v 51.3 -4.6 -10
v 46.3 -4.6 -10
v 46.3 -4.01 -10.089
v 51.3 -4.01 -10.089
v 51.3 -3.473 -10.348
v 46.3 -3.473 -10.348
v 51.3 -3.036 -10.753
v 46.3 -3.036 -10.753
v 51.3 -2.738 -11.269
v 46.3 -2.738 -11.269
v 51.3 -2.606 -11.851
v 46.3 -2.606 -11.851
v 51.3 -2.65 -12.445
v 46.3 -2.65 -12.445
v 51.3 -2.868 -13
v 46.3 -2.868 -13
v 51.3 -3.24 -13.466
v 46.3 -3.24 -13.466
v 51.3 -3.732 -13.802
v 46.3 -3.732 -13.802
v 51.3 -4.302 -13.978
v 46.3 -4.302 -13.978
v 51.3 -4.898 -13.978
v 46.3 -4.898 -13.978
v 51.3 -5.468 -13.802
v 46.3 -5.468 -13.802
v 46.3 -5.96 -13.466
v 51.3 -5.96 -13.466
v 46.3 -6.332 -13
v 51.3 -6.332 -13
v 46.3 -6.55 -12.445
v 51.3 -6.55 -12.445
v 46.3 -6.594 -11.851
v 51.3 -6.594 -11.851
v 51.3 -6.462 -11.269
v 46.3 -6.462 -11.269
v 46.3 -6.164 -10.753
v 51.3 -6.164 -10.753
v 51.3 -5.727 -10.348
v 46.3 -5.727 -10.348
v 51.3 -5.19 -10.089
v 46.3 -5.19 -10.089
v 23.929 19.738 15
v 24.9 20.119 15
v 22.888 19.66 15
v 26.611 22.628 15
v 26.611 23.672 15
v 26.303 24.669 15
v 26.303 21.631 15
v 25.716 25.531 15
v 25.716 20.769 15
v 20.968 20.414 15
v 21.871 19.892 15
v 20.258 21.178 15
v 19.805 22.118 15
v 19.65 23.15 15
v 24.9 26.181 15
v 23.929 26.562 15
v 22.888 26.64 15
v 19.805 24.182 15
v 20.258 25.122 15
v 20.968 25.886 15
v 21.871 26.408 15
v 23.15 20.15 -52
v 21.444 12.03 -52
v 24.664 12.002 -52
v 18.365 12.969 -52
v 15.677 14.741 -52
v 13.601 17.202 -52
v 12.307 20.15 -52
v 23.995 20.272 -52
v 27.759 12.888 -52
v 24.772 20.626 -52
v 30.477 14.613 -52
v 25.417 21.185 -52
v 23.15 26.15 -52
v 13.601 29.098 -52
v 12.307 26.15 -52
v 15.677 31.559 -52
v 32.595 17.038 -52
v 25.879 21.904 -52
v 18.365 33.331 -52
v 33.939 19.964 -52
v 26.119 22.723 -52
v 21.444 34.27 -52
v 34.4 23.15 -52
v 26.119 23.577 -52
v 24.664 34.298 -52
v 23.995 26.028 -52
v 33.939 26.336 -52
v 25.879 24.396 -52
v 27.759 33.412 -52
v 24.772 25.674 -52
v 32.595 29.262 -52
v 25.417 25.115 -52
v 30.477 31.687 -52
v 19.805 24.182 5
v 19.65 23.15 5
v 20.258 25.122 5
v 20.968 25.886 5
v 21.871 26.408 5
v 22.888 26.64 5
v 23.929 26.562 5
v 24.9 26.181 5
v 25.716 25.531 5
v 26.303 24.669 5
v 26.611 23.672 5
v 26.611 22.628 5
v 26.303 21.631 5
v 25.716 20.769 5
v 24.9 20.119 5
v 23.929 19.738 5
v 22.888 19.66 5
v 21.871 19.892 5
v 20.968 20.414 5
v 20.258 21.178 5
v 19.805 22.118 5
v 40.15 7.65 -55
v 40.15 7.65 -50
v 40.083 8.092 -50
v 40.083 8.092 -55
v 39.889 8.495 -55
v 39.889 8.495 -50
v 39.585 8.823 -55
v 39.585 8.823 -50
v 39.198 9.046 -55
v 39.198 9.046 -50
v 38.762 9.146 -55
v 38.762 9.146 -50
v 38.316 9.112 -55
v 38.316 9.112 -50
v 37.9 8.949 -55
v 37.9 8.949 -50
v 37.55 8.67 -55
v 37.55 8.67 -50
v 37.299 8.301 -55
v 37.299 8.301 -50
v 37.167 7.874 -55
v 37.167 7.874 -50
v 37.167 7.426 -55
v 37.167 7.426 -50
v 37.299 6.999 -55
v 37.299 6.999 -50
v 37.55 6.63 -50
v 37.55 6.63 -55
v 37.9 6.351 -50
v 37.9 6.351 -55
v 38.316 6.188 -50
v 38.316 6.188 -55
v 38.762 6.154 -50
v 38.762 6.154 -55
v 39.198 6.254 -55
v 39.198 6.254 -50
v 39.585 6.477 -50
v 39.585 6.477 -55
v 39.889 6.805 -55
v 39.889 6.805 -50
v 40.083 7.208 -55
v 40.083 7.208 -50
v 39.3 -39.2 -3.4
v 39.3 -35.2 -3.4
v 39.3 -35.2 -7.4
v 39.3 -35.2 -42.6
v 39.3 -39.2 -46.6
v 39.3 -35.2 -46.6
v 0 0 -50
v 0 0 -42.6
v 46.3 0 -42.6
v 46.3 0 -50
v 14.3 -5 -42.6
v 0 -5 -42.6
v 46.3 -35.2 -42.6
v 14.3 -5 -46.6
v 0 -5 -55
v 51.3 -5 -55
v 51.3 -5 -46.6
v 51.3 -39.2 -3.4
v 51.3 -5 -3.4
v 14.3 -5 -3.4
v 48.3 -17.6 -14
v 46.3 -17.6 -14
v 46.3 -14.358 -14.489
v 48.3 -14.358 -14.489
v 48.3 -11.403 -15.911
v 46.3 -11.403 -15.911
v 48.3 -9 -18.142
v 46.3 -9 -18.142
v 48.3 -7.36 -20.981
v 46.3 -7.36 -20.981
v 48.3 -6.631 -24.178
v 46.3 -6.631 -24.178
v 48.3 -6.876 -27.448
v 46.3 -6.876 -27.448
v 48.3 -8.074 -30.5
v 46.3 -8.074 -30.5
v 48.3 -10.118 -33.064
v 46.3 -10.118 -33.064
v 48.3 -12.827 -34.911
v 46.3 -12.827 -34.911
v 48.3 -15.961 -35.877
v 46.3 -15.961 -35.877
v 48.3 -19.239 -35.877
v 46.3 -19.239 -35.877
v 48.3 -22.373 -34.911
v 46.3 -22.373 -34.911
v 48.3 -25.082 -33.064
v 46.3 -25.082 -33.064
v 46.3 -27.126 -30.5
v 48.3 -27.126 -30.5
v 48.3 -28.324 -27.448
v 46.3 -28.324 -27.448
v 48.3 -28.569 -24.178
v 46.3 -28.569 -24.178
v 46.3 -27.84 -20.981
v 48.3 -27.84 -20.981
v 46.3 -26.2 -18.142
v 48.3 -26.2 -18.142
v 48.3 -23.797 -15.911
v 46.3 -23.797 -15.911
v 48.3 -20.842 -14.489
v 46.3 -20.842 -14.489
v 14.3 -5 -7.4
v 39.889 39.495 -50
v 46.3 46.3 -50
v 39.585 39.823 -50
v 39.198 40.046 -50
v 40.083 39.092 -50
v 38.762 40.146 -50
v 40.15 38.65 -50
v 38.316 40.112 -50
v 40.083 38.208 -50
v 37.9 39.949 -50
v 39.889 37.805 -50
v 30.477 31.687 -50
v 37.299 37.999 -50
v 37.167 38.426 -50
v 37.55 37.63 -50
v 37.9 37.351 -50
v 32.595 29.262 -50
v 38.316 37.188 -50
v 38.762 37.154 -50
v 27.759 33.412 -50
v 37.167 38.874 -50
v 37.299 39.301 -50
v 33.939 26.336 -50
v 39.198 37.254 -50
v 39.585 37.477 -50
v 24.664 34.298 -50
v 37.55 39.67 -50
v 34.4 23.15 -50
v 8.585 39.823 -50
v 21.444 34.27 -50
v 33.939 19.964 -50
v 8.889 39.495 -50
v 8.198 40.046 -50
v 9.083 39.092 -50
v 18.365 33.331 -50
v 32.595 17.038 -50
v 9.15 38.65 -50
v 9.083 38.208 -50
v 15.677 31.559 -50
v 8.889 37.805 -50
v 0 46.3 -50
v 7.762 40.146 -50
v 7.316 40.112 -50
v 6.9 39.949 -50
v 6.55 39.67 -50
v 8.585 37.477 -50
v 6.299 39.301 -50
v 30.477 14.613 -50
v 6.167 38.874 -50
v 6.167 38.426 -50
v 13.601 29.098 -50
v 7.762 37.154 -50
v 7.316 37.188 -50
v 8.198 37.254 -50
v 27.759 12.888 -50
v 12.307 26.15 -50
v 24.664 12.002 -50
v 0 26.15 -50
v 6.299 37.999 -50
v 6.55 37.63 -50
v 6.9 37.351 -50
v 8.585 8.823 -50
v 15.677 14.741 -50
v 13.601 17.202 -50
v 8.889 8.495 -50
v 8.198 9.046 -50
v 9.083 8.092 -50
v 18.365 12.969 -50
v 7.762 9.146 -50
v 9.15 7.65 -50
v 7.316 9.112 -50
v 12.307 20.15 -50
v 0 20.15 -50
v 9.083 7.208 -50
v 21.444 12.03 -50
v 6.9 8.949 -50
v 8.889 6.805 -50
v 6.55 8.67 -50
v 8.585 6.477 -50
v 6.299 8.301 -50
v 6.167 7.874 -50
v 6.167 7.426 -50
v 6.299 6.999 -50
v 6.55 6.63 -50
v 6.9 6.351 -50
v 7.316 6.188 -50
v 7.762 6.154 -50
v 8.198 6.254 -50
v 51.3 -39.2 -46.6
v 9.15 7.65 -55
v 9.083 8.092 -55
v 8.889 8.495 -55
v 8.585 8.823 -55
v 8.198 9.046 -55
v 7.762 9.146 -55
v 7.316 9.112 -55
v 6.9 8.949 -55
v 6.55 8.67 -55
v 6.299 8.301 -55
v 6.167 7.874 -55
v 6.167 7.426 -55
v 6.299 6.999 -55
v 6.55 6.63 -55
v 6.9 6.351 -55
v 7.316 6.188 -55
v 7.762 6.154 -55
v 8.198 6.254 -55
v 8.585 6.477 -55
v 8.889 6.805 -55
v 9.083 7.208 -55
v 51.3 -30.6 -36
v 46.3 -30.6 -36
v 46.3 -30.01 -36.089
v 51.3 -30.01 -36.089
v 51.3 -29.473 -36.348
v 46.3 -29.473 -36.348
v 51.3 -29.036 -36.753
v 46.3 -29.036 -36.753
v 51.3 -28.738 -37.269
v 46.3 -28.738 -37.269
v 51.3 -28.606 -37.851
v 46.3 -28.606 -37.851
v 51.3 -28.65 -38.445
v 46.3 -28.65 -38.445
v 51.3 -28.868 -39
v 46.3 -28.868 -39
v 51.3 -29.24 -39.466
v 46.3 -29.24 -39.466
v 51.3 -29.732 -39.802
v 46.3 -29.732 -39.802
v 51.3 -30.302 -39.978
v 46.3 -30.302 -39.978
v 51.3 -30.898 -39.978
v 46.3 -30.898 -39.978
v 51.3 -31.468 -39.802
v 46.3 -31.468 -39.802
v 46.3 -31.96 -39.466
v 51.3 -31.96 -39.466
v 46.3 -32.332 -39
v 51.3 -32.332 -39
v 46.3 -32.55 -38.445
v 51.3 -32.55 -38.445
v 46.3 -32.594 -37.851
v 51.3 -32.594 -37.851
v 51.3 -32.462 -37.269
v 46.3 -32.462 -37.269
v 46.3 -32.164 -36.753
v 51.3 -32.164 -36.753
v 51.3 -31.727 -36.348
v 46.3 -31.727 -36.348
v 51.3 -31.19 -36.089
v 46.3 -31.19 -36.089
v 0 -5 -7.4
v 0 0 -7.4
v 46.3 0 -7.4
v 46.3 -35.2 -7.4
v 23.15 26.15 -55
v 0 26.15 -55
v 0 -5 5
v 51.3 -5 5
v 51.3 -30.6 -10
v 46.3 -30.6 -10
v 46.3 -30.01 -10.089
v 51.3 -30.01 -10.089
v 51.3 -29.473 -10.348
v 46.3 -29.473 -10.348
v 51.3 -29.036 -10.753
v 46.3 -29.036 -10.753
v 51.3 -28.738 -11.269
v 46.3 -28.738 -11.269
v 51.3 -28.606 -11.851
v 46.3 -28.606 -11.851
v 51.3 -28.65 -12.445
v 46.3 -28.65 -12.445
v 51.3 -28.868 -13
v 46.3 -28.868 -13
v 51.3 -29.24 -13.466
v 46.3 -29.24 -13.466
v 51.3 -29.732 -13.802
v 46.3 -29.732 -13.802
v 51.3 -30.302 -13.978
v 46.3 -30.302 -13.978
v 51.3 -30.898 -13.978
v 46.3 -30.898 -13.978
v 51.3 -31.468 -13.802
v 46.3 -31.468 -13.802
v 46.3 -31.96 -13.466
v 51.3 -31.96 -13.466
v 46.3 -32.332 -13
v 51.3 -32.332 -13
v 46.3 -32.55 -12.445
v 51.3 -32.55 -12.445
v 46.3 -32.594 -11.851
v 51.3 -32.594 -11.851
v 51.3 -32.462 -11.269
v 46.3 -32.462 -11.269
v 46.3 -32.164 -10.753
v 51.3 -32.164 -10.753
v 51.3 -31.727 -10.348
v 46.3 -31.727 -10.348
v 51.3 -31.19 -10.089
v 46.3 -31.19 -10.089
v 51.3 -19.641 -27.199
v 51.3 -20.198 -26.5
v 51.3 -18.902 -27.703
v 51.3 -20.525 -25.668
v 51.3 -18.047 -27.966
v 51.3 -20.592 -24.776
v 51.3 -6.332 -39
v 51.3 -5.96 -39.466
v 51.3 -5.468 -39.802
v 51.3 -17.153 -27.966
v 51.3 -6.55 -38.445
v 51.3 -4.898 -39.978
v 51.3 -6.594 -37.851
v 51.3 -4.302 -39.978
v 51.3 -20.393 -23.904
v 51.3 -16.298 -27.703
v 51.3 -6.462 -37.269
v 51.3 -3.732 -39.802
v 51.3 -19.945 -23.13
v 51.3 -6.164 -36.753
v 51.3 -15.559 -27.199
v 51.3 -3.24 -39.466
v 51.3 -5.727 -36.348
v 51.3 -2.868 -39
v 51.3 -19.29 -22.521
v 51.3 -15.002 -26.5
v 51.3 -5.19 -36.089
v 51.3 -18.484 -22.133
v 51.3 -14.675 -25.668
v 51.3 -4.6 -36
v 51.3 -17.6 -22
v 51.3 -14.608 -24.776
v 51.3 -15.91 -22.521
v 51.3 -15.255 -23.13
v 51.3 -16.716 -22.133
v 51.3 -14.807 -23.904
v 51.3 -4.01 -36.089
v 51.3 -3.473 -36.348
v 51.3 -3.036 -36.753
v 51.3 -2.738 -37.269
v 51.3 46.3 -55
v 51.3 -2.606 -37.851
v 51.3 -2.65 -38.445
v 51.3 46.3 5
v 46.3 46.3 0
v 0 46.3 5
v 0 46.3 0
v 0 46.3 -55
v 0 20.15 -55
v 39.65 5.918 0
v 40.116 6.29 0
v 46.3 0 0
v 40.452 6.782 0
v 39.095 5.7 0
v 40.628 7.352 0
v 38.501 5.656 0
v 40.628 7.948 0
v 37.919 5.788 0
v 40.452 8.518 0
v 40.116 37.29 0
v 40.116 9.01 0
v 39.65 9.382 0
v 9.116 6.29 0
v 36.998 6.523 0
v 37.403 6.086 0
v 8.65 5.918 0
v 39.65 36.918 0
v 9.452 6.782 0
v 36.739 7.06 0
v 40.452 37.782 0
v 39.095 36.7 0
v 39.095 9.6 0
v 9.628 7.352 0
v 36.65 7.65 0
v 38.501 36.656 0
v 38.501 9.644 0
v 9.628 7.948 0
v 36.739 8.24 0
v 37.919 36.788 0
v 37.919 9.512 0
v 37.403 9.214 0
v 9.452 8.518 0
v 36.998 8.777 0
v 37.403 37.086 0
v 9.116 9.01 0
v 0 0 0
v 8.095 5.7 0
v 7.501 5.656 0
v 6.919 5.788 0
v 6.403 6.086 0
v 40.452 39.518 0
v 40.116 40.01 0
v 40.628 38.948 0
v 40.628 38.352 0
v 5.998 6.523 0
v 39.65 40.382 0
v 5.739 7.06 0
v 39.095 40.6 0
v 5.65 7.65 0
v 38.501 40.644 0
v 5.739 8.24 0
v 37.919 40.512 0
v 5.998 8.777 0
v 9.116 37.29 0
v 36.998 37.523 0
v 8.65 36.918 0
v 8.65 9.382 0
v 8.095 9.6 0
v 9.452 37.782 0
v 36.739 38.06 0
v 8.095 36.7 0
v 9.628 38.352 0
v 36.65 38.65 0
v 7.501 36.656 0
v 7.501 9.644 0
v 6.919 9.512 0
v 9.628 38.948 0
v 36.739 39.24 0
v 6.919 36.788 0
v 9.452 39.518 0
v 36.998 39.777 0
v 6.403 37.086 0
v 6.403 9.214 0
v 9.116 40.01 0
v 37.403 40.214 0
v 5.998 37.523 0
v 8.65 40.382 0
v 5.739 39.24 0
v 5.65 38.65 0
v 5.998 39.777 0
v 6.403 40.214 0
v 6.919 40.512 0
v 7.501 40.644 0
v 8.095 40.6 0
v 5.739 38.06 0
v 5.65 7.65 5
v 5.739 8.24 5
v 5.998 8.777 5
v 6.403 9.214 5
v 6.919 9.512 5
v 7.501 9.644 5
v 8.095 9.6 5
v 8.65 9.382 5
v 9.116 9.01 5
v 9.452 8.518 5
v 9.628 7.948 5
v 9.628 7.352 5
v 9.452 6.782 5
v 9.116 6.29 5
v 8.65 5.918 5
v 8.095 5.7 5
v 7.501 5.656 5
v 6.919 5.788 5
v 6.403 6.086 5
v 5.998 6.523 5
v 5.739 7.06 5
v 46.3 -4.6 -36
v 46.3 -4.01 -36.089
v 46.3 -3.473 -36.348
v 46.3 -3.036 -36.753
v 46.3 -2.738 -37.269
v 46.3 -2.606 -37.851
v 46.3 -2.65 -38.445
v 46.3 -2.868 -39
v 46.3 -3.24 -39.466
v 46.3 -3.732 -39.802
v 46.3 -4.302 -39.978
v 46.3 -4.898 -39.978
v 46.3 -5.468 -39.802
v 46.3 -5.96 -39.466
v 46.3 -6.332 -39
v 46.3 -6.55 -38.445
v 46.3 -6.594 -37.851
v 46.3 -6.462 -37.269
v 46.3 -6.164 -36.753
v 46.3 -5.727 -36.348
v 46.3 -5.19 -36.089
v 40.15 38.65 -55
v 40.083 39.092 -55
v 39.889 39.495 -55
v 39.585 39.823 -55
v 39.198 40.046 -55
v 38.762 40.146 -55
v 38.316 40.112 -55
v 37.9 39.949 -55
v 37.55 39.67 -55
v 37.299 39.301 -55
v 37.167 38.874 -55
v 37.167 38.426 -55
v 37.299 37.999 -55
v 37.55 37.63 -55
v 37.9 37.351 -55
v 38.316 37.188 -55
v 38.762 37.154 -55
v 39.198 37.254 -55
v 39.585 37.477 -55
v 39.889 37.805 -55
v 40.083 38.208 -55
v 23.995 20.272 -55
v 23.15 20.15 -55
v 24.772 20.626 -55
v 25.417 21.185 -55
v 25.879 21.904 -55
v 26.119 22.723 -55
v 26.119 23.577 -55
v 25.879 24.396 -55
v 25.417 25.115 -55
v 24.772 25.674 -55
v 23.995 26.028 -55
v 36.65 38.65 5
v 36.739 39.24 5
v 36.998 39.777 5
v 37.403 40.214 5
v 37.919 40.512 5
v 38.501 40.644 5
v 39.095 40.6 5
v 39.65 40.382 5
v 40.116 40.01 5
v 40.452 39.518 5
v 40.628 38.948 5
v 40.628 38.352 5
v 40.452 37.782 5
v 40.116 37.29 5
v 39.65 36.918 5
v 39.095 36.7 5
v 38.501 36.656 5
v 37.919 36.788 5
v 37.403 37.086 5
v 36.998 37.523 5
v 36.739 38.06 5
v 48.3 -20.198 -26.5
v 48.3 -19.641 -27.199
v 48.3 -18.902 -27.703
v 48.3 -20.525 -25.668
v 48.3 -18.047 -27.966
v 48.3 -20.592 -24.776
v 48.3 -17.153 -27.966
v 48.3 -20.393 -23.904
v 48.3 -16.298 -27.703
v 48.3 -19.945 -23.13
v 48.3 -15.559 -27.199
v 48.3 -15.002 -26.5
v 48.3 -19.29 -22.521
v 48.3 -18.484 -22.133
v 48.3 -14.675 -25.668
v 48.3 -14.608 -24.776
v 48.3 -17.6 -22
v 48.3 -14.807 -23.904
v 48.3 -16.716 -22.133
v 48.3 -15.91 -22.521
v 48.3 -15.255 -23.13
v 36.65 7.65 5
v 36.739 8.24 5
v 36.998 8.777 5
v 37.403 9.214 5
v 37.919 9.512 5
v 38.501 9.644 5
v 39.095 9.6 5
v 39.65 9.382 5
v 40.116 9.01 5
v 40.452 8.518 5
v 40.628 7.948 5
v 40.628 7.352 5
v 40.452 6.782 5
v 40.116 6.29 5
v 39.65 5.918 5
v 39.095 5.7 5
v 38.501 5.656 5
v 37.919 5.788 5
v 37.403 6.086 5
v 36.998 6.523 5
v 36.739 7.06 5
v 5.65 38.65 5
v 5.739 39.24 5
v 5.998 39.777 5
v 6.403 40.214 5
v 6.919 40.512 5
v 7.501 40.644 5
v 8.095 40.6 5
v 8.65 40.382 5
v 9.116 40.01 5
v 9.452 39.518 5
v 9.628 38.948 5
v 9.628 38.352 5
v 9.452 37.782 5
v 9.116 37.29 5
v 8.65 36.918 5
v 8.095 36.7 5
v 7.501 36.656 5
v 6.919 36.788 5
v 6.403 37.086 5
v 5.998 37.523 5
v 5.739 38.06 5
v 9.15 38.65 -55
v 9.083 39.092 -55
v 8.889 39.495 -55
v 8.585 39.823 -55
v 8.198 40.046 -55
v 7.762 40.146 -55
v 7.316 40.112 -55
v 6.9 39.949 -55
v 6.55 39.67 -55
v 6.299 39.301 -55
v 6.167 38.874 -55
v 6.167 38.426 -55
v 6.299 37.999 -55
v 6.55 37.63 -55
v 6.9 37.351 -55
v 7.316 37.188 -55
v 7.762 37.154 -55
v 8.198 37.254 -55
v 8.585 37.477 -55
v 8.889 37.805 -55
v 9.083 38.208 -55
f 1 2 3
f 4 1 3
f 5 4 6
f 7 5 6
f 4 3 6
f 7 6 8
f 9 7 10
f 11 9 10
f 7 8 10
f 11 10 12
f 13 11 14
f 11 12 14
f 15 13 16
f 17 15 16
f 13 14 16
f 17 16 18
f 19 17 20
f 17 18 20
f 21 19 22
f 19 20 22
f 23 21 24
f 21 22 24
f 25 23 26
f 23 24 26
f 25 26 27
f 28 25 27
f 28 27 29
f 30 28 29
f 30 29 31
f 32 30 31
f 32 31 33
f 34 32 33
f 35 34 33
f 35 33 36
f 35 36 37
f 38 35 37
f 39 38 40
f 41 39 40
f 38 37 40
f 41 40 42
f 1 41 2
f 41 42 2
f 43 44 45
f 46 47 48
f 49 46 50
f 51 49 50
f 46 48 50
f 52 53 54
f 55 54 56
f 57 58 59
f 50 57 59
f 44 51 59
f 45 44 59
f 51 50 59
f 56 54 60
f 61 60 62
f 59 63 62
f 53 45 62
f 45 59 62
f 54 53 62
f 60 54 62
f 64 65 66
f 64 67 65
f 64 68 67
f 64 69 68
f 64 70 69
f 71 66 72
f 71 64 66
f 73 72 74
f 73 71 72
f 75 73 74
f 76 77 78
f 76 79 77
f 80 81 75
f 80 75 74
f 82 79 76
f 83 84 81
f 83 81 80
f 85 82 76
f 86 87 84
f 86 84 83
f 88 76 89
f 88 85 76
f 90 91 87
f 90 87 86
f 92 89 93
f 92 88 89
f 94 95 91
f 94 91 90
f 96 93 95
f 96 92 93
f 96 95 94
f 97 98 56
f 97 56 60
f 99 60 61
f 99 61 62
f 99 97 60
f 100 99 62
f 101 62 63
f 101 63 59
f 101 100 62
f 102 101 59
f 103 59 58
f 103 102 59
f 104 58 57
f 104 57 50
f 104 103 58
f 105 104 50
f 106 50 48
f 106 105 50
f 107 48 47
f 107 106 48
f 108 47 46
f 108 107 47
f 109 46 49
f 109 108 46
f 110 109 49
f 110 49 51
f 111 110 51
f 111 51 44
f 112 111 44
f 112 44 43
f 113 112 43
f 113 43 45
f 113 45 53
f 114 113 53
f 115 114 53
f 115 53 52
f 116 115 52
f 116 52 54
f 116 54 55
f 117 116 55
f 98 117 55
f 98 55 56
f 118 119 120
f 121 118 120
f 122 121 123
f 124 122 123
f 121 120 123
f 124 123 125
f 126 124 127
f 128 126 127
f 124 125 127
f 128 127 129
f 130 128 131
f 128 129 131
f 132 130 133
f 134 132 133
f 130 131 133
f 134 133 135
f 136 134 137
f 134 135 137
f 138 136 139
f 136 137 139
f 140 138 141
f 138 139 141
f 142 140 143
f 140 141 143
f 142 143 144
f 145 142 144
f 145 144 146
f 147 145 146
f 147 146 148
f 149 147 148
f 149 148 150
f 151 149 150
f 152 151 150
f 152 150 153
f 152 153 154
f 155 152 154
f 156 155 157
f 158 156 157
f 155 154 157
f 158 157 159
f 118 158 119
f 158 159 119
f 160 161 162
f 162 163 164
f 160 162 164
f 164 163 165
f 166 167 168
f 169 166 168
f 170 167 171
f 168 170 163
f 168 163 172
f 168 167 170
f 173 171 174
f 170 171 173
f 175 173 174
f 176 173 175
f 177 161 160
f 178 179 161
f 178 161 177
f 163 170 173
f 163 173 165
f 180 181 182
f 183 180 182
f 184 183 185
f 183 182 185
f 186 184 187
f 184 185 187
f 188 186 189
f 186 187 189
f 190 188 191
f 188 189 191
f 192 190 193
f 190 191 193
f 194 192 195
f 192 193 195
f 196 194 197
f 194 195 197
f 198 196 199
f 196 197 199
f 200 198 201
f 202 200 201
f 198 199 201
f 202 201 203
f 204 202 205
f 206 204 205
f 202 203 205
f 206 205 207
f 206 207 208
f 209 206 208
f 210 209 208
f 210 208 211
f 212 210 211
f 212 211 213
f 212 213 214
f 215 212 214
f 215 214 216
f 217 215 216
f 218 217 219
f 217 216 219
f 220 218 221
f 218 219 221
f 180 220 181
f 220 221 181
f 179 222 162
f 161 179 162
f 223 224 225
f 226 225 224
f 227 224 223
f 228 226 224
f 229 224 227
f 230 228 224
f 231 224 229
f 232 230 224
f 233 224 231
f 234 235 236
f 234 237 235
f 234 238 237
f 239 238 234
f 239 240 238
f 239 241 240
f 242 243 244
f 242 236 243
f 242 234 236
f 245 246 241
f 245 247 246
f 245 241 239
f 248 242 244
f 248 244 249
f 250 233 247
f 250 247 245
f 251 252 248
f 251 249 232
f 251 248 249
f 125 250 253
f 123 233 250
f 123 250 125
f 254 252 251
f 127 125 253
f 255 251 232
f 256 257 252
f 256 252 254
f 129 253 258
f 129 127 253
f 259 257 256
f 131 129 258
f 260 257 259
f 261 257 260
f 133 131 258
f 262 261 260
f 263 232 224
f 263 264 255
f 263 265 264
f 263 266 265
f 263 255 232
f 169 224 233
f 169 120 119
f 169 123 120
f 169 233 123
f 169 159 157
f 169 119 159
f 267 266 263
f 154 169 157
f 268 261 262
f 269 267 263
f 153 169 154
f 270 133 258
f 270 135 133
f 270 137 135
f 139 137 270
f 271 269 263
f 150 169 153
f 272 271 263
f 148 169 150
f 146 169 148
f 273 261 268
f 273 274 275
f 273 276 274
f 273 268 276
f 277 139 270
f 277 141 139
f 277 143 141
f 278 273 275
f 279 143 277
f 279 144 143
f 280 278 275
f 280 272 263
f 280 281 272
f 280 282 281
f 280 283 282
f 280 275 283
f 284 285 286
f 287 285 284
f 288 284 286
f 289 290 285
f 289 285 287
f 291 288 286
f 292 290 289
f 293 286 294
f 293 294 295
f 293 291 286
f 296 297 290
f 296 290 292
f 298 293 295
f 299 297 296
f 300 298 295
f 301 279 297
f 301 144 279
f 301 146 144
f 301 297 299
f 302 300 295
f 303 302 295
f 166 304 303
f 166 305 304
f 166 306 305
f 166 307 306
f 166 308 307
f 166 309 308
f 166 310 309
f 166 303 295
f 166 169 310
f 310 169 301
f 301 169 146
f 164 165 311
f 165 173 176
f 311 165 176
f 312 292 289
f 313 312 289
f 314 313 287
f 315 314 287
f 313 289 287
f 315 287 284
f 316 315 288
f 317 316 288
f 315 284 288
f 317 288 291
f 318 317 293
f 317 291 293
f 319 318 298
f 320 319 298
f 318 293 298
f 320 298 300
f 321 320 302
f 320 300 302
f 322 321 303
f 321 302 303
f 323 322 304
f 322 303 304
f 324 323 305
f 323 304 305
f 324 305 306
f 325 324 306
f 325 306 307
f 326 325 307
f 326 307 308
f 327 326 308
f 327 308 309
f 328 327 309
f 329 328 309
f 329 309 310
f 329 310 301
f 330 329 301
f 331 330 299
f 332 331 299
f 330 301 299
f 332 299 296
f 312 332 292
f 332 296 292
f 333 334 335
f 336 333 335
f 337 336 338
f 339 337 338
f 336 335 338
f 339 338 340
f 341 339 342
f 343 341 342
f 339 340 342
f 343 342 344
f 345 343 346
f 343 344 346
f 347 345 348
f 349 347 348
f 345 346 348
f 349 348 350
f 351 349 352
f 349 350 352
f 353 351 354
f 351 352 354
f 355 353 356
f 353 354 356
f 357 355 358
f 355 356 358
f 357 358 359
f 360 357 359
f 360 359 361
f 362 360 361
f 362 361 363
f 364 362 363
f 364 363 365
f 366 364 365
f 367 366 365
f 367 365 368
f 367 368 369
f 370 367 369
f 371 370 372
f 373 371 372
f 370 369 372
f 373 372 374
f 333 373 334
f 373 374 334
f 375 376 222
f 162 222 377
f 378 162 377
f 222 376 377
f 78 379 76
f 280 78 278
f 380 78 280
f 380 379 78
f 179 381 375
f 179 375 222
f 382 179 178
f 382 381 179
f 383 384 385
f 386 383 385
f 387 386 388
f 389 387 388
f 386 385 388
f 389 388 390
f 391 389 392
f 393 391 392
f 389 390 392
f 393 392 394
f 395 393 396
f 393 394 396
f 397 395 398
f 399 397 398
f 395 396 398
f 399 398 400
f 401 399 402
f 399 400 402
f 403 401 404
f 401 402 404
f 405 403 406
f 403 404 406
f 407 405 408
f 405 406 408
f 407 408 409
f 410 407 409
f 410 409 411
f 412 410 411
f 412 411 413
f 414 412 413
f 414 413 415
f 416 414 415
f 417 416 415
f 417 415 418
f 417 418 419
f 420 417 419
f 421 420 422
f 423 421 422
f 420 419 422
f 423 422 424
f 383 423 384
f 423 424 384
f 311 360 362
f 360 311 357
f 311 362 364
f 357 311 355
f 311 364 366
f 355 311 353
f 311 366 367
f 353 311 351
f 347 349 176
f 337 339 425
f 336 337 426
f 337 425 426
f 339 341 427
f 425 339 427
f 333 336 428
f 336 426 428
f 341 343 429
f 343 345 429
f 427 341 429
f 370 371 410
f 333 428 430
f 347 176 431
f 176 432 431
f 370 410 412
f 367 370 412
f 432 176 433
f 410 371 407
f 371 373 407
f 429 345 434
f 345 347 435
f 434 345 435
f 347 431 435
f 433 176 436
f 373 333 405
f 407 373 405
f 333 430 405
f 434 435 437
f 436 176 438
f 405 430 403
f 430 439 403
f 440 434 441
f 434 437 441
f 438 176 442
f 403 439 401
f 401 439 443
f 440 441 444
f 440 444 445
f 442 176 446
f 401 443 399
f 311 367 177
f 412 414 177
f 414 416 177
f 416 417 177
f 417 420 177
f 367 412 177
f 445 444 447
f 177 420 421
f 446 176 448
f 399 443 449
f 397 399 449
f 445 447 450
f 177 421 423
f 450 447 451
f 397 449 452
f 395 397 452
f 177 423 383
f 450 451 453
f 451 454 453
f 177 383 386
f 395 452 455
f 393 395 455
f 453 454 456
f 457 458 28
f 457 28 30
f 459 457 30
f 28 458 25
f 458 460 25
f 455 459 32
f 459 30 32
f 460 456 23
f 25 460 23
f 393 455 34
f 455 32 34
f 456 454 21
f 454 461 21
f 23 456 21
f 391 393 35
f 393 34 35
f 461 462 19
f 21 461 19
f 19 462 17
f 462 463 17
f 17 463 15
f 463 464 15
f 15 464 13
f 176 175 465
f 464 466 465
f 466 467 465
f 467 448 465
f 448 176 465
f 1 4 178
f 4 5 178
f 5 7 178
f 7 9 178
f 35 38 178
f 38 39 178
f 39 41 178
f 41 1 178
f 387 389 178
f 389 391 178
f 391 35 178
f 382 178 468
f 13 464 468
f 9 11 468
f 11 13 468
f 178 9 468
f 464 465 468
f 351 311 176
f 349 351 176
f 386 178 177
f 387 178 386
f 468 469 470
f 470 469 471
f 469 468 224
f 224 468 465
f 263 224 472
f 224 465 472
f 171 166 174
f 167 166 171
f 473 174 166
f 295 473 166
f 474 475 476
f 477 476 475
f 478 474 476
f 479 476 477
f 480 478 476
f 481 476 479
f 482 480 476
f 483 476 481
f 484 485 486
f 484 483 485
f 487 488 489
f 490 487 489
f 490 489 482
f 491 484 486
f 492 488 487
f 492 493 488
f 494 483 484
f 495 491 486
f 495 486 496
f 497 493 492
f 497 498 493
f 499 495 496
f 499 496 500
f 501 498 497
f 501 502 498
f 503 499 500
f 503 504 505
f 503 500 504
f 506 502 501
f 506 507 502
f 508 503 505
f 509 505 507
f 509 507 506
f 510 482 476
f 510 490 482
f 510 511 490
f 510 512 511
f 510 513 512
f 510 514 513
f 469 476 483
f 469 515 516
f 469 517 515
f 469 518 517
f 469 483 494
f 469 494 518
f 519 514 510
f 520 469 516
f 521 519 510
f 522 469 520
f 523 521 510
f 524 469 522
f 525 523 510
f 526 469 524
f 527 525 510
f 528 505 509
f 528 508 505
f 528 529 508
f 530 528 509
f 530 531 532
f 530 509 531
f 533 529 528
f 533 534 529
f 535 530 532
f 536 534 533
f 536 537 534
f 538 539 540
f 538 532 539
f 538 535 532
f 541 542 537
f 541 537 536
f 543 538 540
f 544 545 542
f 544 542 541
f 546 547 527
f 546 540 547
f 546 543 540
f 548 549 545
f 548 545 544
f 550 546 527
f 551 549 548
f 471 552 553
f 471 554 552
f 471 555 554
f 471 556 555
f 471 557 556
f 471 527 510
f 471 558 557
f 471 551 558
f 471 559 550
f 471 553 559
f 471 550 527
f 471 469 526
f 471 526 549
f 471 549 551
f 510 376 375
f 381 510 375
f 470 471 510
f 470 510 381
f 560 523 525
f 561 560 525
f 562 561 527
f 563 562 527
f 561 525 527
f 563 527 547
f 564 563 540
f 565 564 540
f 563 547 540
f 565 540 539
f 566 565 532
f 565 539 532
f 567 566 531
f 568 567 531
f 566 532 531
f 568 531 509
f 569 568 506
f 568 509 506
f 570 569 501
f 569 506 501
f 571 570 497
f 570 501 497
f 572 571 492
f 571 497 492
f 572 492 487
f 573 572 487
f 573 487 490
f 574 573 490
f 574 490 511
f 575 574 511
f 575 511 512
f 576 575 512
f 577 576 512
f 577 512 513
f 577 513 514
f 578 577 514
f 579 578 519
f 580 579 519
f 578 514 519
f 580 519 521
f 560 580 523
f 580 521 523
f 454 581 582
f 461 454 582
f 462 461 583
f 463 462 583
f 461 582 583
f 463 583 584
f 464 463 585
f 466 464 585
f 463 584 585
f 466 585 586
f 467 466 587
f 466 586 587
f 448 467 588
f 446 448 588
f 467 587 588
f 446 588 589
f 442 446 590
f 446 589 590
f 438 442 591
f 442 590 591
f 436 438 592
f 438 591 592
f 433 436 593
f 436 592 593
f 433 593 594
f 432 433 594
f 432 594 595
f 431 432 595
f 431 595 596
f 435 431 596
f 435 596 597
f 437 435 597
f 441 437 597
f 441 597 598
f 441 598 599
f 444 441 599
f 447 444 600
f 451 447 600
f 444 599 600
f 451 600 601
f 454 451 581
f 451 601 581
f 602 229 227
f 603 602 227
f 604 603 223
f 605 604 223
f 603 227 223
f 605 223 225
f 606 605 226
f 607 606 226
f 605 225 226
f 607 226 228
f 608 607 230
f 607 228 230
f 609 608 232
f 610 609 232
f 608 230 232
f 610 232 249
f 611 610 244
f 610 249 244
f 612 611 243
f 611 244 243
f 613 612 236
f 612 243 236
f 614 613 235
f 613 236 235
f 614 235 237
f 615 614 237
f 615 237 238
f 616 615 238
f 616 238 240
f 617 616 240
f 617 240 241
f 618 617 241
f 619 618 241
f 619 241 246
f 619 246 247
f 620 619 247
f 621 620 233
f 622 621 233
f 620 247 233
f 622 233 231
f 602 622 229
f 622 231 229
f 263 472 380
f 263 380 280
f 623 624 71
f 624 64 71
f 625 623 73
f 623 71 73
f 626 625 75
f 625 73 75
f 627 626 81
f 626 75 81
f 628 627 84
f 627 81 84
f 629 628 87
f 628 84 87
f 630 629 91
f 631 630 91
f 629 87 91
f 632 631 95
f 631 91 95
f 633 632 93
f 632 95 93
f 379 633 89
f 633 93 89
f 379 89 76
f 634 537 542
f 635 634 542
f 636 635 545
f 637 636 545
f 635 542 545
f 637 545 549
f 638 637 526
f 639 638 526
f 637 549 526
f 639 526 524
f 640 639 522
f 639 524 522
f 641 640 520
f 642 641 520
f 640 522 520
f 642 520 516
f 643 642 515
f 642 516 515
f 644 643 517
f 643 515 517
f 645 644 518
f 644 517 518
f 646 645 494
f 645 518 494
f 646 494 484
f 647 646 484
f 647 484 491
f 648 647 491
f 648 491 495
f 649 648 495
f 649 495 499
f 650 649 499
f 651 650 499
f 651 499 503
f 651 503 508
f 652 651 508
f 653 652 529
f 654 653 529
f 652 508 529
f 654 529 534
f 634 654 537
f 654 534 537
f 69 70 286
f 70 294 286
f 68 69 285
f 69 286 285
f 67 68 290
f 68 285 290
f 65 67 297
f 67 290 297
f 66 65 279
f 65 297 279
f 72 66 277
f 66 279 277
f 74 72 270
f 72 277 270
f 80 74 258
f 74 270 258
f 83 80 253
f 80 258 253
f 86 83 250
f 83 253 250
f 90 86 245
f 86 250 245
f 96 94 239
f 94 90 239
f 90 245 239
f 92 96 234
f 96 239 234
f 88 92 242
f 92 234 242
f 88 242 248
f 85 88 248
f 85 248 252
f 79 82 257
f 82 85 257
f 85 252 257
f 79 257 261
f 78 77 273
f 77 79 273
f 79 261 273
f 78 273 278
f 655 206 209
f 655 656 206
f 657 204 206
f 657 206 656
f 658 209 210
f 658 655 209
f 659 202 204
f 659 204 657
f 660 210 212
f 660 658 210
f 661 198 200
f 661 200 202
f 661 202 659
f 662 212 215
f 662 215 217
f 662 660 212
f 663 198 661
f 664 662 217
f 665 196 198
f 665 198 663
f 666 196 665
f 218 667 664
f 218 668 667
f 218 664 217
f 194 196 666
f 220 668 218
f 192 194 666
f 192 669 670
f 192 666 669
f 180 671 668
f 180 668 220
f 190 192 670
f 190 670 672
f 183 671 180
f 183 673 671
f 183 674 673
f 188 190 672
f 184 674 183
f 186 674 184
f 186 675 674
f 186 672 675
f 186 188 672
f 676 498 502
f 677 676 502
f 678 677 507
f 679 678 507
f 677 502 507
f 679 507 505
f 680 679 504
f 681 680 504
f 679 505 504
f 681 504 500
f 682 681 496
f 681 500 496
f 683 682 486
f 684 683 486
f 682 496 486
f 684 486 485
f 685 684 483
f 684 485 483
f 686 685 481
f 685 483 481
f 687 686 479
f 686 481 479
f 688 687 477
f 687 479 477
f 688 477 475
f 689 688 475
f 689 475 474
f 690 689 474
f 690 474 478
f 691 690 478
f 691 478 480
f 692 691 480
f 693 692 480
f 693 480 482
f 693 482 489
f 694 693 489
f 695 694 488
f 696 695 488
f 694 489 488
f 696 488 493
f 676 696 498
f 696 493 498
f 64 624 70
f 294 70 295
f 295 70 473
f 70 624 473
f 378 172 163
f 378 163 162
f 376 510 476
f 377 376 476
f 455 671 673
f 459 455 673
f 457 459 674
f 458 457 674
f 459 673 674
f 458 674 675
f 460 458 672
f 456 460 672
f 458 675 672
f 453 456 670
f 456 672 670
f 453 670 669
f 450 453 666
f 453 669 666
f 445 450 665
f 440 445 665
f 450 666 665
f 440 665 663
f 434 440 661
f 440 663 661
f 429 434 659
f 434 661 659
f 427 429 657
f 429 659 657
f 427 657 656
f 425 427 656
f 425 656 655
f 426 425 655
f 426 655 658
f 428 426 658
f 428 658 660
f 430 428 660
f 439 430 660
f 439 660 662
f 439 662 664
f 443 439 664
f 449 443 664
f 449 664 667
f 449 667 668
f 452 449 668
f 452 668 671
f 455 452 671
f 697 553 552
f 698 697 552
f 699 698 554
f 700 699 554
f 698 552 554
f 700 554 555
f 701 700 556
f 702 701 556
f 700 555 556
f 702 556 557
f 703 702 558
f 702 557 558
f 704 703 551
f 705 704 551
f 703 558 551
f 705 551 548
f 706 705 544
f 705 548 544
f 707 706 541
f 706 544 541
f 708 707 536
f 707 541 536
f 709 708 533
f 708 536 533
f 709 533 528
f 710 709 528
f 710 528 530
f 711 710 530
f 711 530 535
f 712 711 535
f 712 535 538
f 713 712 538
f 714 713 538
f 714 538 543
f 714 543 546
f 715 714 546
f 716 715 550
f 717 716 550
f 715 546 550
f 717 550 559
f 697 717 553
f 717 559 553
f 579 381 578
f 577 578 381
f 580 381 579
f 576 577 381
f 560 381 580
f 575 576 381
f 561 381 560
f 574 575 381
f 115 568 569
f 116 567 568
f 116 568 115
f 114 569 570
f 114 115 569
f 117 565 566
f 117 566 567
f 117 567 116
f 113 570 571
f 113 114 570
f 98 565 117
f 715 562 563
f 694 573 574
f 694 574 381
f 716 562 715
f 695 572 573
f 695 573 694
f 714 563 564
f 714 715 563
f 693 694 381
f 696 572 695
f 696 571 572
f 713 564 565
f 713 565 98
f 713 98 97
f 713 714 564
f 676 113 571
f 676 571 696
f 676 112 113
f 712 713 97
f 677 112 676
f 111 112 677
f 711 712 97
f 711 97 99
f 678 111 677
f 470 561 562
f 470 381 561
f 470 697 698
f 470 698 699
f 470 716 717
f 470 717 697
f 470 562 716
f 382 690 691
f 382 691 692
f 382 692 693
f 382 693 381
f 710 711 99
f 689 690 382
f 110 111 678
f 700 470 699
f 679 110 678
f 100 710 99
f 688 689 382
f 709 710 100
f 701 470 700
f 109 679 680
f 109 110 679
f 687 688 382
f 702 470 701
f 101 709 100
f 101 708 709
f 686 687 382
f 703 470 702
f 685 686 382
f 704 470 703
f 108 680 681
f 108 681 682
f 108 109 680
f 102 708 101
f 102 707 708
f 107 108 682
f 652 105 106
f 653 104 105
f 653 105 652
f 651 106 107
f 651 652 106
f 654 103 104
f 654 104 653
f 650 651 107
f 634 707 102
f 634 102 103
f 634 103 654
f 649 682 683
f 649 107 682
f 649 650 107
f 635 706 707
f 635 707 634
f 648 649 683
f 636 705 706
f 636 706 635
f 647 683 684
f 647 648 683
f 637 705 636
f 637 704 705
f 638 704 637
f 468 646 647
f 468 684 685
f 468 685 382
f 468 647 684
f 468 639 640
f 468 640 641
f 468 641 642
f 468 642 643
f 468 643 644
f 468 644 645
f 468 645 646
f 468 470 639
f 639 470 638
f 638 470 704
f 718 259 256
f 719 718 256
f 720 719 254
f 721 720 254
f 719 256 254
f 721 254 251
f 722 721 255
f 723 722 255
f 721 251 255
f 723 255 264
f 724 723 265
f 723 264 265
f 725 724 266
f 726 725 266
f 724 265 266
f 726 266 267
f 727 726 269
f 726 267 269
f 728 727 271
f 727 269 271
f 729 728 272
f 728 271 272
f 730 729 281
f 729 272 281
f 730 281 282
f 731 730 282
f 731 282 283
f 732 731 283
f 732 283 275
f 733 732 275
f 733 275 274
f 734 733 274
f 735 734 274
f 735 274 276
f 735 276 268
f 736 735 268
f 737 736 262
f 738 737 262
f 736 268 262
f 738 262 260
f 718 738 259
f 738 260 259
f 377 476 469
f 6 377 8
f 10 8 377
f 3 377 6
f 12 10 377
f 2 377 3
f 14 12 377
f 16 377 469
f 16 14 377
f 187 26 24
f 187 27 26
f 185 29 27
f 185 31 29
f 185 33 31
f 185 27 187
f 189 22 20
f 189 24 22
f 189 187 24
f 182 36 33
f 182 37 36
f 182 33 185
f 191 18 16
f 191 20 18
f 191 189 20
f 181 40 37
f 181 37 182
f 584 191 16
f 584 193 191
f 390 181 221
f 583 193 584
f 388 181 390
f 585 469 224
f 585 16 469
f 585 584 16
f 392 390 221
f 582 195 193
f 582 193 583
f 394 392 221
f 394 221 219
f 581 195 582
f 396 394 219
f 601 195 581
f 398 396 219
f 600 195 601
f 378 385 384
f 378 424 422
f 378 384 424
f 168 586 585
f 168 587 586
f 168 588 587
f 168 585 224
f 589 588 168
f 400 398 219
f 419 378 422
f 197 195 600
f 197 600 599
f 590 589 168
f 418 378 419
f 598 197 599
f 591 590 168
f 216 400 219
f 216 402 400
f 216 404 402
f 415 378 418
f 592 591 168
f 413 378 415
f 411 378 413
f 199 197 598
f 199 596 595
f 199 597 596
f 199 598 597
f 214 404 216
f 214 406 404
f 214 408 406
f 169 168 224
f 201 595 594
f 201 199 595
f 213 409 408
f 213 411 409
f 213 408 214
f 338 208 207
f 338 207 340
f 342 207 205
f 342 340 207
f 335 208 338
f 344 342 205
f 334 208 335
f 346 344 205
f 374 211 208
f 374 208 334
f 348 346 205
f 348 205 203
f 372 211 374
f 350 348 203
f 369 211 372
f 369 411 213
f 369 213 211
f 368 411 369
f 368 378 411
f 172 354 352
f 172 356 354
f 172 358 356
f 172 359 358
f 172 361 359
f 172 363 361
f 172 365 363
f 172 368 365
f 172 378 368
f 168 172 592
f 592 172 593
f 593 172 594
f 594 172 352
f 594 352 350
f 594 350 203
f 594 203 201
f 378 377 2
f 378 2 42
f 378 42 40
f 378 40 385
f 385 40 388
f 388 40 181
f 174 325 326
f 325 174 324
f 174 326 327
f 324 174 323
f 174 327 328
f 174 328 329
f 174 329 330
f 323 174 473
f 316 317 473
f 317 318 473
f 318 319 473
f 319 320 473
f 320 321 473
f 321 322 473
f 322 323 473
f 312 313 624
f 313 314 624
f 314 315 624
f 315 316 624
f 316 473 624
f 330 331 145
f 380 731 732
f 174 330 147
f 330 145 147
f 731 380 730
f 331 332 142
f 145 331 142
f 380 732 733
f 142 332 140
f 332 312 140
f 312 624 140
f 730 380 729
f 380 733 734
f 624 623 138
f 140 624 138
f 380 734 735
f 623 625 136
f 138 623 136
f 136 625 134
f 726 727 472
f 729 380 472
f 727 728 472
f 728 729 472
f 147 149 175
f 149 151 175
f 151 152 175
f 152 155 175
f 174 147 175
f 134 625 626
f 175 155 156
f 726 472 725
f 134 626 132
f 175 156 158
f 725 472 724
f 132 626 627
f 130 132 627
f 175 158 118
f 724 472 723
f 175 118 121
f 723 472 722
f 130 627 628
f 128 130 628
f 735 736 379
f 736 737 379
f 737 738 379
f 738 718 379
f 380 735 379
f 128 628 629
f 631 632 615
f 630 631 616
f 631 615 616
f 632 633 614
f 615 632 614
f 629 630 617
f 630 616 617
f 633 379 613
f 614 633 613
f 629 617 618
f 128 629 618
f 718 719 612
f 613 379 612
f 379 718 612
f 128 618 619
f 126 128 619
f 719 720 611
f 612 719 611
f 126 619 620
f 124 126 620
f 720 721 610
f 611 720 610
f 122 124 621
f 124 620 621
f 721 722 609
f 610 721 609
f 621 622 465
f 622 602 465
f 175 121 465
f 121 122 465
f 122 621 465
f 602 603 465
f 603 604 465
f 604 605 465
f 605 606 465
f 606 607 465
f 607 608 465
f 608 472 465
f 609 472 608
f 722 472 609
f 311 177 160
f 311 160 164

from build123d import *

# Parameters (mm, degrees)
BOSS_EXTRUDE1_DEPTH  = 46.3
SKETCH3_R            = 11.25
CUT_EXTRUDE2_DEPTH   = 2
SKETCH3_5_R          = 1.5
SKETCH3_5_R_2        = 3
CUT_EXTRUDE3_DEPTH   = 5
SKETCH4_R            = 2
CUT_EXTRUDE4_DEPTH   = 5
SKETCH5_W            = 5
SKETCH5_H            = 35.2
BOSS_EXTRUDE2_DEPTH  = 35.2
BOSS_EXTRUDE4_DEPTH  = 12
SKETCH8_R            = 2
SKETCH8_R_2          = 3
CUT_EXTRUDE5_DEPTH   = 5
SKETCH8_3_R          = 11
CUT_EXTRUDE6_DEPTH   = 2
SKETCH10_W           = 51.3
SKETCH10_H           = 12.4
BOSS_EXTRUDE8_DEPTH  = 5
SKETCH11_W           = 51.3
SKETCH11_H           = 12.4
BOSS_EXTRUDE9_DEPTH  = 5
BOSS_EXTRUDE10_DEPTH = 4
BOSS_EXTRUDE11_DEPTH = 4
SKETCH15_W           = 23.15
SKETCH15_H           = 6
CUT_EXTRUDE7_DEPTH   = 5
SKETCH18_R           = 3.5
BOSS_EXTRUDE12_DEPTH = 15


with BuildPart() as part:
    # Sketch1 → Boss-Extrude1 (new body)
    with BuildSketch(Plane(origin=(0, 0, 0), x_dir=(1, 0, 0), z_dir=(0, 1, 0))):
        Polygon((0, 0), (46.3, 0), (46.3, 50), (0, 50), (0, 55), (51.3, 55), (51.3, -5), (0, -5), align=None)
    extrude(amount=BOSS_EXTRUDE1_DEPTH)

    # Sketch3 → Cut-Extrude2 (cut)
    with BuildSketch(Plane.XY.offset(-50)):
        with Locations((23.15, 23.15)):
            Circle(SKETCH3_R)
    extrude(amount=-CUT_EXTRUDE2_DEPTH, mode=Mode.SUBTRACT)

    # Sketch3<5> → Cut-Extrude3 (cut)
    with BuildSketch(Plane.XY.offset(-50)):
        with Locations((38.65, 38.65)):
            Circle(SKETCH3_5_R)
        with Locations((7.65, 38.65)):
            Circle(SKETCH3_5_R)
        with Locations((7.65, 7.65)):
            Circle(SKETCH3_5_R)
        with Locations((38.65, 7.65)):
            Circle(SKETCH3_5_R)
        with Locations((23.15, 23.15)):
            Circle(SKETCH3_5_R_2)
    extrude(amount=-CUT_EXTRUDE3_DEPTH, mode=Mode.SUBTRACT)

    # Sketch4 → Cut-Extrude4 (cut)
    with BuildSketch(Plane(origin=(0, 0, 0), x_dir=(-1, 0, 0), z_dir=(0, 0, -1))):
        with Locations((-7.65, 7.65)):
            Circle(SKETCH4_R)
        with Locations((-7.65, 38.65)):
            Circle(SKETCH4_R)
        with Locations((-38.65, 7.65)):
            Circle(SKETCH4_R)
        with Locations((-38.65, 38.65)):
            Circle(SKETCH4_R)
    extrude(amount=-CUT_EXTRUDE4_DEPTH, mode=Mode.SUBTRACT)

    # Sketch5 → Boss-Extrude2 (add)
    with BuildSketch(Plane.XZ):
        with Locations((48.8, -25)):
            Rectangle(SKETCH5_W, SKETCH5_H)
    extrude(amount=BOSS_EXTRUDE2_DEPTH)

    # Sketch6 → Boss-Extrude4 (add)
    with BuildSketch(Plane(origin=(51.3, 0, 0), x_dir=(0, 0, -1), z_dir=(1, 0, 0))):
        Polygon((7.4, 0), (3.4, 0), (3.4, -39.2), (46.6, -39.2), (46.6, 0), (42.6, 0), (42.6, -35.2), (7.4, -35.2), align=None)
    extrude(amount=-BOSS_EXTRUDE4_DEPTH)

    # Sketch8 → Cut-Extrude5 (cut)
    with BuildSketch(Plane.ZY.offset(-46.3)):
        with Locations((-12, -4.6)):
            Circle(SKETCH8_R)
        with Locations((-38, -4.6)):
            Circle(SKETCH8_R)
        with Locations((-38, -30.6)):
            Circle(SKETCH8_R)
        with Locations((-12, -30.6)):
            Circle(SKETCH8_R)
        with Locations((-25, -17.6)):
            Circle(SKETCH8_R_2)
    extrude(amount=-CUT_EXTRUDE5_DEPTH, mode=Mode.SUBTRACT)

    # Sketch8<3> → Cut-Extrude6 (cut)
    with BuildSketch(Plane.ZY.offset(-46.3)):
        with Locations((-25, -17.6)):
            Circle(SKETCH8_3_R)
    extrude(amount=-CUT_EXTRUDE6_DEPTH, mode=Mode.SUBTRACT)

    # Sketch10 → Boss-Extrude8 (add)
    with BuildSketch(Plane.XZ):
        with Locations((25.65, -1.2)):
            Rectangle(SKETCH10_W, SKETCH10_H)
    extrude(amount=BOSS_EXTRUDE8_DEPTH)

    # Sketch11 → Boss-Extrude9 (add)
    with BuildSketch(Plane.XZ):
        with Locations((25.65, -48.8)):
            Rectangle(SKETCH11_W, SKETCH11_H)
    extrude(amount=BOSS_EXTRUDE9_DEPTH)

    # Sketch12 → Boss-Extrude10 (add)
    with BuildSketch(Plane.XY.offset(-42.6)):
        Polygon((39.3, -5), (14.3, -5), (39.3, -35.2), align=None)
    extrude(amount=-BOSS_EXTRUDE10_DEPTH)

    # Sketch13 → Boss-Extrude11 (add)
    with BuildSketch(Plane(origin=(0, 0, -7.4), x_dir=(-1, 0, 0), z_dir=(0, 0, -1))):
        Polygon((-39.3, -5), (-14.3, -5), (-39.3, -35.2), align=None)
    extrude(amount=-BOSS_EXTRUDE11_DEPTH)

    # Sketch15 → Cut-Extrude7 (cut)
    with BuildSketch(Plane(origin=(0, 0, -55), x_dir=(-1, 0, 0), z_dir=(0, 0, -1))):
        with Locations((-11.575, 23.15)):
            Rectangle(SKETCH15_W, SKETCH15_H)
    extrude(amount=-CUT_EXTRUDE7_DEPTH, mode=Mode.SUBTRACT)

    # Sketch18 → Boss-Extrude12 (add)
    with BuildSketch(Plane(origin=(0, 0, 0), x_dir=(-1, 0, 0), z_dir=(0, 0, -1))):
        with Locations((-23.15, 23.15)):
            Circle(SKETCH18_R)
    extrude(amount=-BOSS_EXTRUDE12_DEPTH)


solid = part.part
